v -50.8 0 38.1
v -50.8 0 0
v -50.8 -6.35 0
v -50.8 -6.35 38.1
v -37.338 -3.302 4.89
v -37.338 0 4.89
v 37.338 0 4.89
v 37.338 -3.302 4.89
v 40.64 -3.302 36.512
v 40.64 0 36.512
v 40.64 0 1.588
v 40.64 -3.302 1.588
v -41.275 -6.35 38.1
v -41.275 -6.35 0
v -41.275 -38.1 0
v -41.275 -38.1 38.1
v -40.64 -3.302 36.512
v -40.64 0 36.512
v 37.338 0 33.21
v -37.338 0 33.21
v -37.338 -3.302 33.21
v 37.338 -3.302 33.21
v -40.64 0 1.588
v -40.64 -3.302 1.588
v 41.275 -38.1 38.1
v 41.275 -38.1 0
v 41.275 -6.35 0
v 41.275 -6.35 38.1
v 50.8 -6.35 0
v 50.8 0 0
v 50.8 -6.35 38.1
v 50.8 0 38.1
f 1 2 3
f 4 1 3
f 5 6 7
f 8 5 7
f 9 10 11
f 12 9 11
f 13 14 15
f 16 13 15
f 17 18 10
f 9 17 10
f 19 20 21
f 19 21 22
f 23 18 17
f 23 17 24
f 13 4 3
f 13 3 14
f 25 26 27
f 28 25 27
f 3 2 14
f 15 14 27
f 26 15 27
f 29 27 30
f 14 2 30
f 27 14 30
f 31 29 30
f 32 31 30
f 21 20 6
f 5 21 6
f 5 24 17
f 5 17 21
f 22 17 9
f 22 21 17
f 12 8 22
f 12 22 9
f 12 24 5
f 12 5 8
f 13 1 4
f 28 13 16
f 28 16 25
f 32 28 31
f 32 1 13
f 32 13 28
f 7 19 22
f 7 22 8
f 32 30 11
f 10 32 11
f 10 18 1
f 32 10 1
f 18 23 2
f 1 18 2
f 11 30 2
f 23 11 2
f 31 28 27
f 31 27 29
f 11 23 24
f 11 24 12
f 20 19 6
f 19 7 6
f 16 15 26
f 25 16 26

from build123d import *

# Parameters (mm, degrees)
BOSS_EXTRUDE1_DEPTH = 38.1
SKETCH2_W           = 81.28
SKETCH2_H           = 34.925
SKETCH2_W_2         = 74.676
SKETCH2_H_2         = 28.321
CUT_EXTRUDE1_DEPTH  = 3.302


with BuildPart() as part:
    # Sketch1 → Boss-Extrude1 (new body)
    with BuildSketch(Plane.XY):
        Polygon((-50.8, 0), (-50.8, -6.35), (-41.275, -6.35), (-41.275, -38.1), (41.275, -38.1), (41.275, -6.35), (50.8, -6.35), (50.8, 0), align=None)
    extrude(amount=BOSS_EXTRUDE1_DEPTH)

    # Sketch2 → Cut-Extrude1 (cut)
    with BuildSketch(Plane(origin=(0, 0, 0), x_dir=(1, 0, 0), z_dir=(0, 1, 0))):
        with Locations((0, -19.05)):
            Rectangle(SKETCH2_W, SKETCH2_H)
        with Locations((0, -19.05)):
            Rectangle(SKETCH2_W_2, SKETCH2_H_2, mode=Mode.SUBTRACT)
    extrude(amount=-CUT_EXTRUDE1_DEPTH, mode=Mode.SUBTRACT)


solid = part.part
